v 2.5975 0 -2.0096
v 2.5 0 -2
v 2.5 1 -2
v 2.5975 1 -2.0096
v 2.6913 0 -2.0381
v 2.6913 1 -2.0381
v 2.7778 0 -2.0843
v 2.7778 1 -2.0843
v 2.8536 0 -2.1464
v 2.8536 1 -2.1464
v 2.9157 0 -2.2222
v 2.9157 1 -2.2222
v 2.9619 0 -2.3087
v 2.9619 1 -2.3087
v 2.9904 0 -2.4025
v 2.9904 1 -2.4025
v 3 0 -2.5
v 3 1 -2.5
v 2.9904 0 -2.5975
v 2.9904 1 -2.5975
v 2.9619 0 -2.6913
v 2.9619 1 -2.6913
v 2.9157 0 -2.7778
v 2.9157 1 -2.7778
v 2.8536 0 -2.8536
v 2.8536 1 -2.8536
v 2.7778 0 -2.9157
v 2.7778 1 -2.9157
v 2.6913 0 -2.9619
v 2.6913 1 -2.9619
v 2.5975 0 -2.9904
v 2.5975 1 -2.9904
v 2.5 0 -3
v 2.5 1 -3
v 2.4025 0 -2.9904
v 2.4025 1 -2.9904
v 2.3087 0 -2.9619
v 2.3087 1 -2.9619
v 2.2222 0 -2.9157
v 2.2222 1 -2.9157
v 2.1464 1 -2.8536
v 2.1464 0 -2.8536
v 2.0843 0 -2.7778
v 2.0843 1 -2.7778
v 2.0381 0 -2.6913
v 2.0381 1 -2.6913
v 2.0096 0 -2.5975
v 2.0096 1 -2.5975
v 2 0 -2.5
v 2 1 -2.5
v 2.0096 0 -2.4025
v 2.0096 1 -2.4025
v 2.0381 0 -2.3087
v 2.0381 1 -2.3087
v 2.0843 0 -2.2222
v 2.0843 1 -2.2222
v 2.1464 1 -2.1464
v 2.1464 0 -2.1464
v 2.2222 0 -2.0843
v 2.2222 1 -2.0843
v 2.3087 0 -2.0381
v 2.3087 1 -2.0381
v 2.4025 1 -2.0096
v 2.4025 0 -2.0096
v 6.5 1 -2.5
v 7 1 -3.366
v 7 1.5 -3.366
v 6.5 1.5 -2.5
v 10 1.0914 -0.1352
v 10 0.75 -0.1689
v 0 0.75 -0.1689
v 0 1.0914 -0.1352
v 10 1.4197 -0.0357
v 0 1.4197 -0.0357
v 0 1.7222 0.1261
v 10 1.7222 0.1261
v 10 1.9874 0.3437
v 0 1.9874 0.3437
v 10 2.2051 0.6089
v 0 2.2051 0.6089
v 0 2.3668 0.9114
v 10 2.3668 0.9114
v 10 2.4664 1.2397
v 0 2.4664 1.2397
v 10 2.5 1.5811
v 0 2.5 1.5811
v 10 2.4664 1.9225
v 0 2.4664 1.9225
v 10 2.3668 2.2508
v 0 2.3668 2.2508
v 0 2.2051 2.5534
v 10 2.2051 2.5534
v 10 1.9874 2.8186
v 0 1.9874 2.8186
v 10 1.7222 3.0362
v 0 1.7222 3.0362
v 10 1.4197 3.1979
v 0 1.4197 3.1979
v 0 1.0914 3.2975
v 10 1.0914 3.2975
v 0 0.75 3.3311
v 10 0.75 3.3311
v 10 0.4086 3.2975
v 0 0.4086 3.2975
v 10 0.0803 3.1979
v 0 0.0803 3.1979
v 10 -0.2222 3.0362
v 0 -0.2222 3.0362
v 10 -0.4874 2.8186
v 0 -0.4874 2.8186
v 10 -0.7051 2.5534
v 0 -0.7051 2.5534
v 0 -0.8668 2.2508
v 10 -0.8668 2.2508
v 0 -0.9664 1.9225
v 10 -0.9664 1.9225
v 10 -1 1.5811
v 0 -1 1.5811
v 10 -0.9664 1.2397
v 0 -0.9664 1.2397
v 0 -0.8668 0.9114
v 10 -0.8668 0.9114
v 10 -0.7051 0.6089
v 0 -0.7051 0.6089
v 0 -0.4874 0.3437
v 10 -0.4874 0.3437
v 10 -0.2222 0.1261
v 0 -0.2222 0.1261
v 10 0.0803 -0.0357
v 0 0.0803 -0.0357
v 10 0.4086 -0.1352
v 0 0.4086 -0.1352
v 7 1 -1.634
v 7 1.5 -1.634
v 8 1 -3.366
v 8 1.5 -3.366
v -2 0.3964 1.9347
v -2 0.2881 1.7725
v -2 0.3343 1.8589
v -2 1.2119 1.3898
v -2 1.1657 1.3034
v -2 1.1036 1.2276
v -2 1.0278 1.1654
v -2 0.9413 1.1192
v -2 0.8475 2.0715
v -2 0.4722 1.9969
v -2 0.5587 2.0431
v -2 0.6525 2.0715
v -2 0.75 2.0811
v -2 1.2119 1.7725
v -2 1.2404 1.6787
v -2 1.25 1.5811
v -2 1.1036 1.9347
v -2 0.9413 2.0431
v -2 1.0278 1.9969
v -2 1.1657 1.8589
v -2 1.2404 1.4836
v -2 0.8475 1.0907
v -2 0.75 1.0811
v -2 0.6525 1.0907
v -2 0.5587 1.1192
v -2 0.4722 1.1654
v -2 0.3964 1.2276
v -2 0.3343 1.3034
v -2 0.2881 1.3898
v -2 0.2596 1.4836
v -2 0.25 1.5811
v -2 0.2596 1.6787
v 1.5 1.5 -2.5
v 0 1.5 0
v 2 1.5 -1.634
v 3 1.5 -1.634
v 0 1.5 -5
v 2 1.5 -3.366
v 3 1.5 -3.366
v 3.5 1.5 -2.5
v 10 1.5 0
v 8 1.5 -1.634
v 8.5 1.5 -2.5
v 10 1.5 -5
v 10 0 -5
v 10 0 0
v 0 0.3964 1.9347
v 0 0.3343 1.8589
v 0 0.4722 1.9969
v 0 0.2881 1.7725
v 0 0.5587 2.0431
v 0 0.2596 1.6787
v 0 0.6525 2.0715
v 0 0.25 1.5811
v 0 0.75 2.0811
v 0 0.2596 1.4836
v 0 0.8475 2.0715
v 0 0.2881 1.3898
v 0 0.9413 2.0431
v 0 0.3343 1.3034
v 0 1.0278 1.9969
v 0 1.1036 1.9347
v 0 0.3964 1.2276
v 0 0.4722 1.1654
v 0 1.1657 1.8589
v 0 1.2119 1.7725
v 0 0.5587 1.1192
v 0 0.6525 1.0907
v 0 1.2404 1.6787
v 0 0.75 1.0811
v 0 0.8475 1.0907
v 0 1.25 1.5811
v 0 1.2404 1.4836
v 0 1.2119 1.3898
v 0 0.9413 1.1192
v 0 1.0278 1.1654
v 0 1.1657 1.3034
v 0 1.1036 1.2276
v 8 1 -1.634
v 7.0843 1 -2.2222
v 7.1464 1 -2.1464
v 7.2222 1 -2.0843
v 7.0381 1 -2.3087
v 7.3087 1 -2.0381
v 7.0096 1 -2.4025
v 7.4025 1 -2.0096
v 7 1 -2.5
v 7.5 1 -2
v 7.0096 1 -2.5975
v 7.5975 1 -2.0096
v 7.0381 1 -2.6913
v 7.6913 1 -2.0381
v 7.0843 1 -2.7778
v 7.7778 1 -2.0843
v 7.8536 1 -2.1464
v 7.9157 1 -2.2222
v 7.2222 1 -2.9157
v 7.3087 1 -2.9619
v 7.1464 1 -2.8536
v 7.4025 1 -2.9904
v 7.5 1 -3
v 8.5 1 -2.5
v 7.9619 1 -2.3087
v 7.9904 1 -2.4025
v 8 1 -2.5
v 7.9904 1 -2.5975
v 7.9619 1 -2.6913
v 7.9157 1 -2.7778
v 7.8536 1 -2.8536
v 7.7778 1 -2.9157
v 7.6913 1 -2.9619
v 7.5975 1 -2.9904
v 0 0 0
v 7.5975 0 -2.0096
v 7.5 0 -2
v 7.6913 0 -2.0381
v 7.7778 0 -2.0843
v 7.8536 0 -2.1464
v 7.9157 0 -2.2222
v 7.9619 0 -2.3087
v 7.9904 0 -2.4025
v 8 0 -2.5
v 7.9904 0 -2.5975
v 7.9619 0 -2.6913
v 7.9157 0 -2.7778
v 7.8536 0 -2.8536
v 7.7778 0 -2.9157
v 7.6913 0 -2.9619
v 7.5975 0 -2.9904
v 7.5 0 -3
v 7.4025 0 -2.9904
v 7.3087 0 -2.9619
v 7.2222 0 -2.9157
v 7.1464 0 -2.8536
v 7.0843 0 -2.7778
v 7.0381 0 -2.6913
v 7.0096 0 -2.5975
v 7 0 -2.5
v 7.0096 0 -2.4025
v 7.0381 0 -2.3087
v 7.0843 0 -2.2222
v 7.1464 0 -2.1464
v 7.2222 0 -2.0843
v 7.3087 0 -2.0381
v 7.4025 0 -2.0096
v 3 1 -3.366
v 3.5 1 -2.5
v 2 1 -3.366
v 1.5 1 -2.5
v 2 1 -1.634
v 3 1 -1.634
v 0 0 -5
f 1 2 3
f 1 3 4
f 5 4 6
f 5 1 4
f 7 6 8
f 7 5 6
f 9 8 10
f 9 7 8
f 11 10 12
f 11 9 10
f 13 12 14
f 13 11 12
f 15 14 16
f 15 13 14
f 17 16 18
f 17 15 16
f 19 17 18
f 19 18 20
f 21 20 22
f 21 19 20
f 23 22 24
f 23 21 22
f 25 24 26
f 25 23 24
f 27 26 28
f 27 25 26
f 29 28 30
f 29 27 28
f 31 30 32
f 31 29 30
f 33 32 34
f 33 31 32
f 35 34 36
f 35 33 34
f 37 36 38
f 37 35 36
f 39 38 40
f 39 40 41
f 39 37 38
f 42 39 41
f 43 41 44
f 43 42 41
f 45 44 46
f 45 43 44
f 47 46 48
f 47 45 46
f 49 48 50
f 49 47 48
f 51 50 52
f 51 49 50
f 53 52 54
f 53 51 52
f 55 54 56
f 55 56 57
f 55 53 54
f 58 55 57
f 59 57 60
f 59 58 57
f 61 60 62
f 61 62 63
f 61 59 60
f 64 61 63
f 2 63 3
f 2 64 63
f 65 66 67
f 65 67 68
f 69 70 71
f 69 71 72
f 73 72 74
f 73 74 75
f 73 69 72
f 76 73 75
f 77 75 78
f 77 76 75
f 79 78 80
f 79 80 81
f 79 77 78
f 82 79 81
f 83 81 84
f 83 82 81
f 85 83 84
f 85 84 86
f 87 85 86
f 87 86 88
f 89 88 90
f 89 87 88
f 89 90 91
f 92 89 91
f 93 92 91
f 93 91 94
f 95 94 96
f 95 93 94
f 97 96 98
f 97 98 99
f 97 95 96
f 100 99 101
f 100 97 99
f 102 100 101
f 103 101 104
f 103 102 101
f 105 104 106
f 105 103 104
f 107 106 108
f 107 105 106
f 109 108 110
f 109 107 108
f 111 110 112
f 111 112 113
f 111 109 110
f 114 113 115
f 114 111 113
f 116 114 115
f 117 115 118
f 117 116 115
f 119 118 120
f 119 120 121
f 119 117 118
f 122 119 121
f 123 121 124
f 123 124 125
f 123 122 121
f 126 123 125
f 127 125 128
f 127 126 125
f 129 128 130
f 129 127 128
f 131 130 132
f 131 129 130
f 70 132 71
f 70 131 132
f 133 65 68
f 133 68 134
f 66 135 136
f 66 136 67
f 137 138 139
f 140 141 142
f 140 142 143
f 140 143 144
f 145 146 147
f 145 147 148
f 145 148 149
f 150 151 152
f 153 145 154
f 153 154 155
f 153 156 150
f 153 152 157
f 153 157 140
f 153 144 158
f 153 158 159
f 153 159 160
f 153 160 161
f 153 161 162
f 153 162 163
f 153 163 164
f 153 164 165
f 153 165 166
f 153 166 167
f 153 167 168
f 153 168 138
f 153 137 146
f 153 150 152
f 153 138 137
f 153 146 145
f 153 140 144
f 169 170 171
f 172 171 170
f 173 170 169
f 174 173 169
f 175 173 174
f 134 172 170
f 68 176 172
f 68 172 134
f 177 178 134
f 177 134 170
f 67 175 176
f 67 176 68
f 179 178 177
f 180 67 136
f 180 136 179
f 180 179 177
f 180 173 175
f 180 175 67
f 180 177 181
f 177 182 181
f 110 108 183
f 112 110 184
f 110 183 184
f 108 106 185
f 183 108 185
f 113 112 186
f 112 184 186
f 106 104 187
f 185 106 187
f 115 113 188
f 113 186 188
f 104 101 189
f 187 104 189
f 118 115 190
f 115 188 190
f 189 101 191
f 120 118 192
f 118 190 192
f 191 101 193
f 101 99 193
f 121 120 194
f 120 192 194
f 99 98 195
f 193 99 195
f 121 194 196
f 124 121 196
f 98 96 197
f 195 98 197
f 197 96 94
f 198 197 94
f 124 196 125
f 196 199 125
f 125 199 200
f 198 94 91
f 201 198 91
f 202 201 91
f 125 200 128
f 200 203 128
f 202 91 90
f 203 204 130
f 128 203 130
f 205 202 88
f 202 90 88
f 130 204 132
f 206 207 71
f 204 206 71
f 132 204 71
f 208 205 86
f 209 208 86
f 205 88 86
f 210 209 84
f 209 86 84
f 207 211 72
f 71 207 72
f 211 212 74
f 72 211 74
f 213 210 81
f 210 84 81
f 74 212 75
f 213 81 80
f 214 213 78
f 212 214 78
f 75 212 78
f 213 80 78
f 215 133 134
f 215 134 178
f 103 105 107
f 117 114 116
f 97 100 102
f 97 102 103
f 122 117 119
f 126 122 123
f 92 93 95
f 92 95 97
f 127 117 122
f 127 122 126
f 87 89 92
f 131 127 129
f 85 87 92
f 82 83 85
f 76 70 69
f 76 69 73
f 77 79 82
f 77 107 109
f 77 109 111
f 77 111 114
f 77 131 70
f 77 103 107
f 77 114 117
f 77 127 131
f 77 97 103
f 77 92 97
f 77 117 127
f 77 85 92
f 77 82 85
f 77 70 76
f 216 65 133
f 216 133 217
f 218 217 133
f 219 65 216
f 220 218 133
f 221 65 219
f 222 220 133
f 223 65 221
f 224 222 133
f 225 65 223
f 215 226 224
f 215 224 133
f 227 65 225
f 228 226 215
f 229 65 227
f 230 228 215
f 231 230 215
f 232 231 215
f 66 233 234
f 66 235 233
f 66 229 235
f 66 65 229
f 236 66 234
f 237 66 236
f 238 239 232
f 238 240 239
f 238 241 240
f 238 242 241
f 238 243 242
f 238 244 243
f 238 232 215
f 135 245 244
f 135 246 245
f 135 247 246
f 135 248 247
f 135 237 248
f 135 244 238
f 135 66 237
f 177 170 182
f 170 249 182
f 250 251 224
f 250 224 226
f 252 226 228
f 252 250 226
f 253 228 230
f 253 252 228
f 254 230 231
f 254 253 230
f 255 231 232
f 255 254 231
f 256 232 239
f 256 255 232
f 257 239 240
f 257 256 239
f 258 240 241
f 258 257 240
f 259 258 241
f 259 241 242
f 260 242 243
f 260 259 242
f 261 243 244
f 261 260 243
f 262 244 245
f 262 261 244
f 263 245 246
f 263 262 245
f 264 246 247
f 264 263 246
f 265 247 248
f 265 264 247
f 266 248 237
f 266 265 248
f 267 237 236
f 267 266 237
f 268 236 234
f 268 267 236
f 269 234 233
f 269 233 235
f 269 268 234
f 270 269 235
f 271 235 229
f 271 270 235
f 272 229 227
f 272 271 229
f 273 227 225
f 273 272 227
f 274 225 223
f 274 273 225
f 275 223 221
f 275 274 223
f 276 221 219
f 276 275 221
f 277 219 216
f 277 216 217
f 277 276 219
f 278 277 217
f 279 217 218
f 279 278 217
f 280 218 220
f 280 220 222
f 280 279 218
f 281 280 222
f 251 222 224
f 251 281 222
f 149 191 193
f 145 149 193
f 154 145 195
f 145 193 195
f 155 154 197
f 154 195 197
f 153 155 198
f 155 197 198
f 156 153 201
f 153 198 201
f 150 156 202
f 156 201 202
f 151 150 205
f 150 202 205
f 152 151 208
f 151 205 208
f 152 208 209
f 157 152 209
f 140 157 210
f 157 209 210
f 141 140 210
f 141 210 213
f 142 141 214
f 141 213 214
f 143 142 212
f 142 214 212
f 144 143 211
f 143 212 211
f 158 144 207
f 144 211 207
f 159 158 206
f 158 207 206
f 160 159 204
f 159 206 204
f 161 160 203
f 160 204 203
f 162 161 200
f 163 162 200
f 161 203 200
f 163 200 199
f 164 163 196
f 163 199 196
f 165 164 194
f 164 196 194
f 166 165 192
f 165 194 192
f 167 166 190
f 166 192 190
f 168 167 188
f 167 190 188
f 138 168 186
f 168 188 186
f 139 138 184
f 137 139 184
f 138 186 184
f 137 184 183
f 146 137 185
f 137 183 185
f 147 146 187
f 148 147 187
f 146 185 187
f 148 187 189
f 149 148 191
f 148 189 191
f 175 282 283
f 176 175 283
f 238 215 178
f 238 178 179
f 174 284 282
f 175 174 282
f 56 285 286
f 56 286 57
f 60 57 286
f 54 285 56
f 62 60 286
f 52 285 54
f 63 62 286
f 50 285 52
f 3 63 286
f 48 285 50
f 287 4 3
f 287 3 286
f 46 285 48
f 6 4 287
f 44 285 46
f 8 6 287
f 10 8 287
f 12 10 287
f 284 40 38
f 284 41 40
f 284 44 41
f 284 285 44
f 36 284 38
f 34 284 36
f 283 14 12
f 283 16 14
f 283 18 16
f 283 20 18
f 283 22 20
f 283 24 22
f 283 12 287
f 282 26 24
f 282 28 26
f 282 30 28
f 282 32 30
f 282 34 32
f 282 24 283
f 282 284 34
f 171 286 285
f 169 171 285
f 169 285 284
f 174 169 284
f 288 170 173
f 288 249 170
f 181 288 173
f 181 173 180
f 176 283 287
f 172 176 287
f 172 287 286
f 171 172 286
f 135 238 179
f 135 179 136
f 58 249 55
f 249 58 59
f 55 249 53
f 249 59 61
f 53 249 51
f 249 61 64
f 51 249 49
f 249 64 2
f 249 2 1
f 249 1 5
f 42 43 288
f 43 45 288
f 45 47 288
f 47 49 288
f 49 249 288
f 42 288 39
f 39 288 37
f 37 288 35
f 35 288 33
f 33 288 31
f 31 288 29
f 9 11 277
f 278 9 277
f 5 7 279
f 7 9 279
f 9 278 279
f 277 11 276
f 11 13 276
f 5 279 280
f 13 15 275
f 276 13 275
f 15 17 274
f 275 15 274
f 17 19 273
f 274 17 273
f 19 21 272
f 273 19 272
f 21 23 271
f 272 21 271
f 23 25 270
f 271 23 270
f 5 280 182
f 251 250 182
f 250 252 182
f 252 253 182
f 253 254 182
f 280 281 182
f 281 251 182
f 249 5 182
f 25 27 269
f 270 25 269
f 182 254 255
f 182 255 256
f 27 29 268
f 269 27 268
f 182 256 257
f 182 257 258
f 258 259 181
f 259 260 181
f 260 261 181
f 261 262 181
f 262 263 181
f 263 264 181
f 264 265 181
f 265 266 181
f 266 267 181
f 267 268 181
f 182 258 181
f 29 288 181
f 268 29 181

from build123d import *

# Parameters (mm, degrees)
SKETCH_1_W      = 10
SKETCH_1_H      = 5
SKETCH_1_R      = 0.5
EXTRUDE_1_DEPTH = 1
SKETCH_2_W      = 10
SKETCH_2_H      = 5
EXTRUDE_2_DEPTH = 0.5
SKETCH_3_R      = 1.75
EXTRUDE_3_DEPTH = 10
SKETCH_5_R      = 0.5
EXTRUDE_4_DEPTH = 2


with BuildPart() as part:
    # 草图1 → 凸台-拉伸1 (new body)
    with BuildSketch(Plane(origin=(0, 0, 0), x_dir=(1, 0, 0), z_dir=(0, 1, 0))):
        with Locations((5, 2.5)):
            Rectangle(SKETCH_1_W, SKETCH_1_H)
        with Locations(Location((2.5, 2.5, 0), (0, 0, 270))):
            Circle(SKETCH_1_R, mode=Mode.SUBTRACT)
        with Locations(Location((7.5, 2.5, 0), (0, 0, 270))):
            Circle(SKETCH_1_R, mode=Mode.SUBTRACT)
    extrude(amount=EXTRUDE_1_DEPTH)

    # 草图2 → 凸台-拉伸2 (add)
    with BuildSketch(Plane(origin=(0, 1, 0), x_dir=(1, 0, 0), z_dir=(0, 1, 0))):
        with Locations((5, 2.5)):
            Rectangle(SKETCH_2_W, SKETCH_2_H)
        Polygon((3, 1.633974596), (2, 1.633974596), (1.5, 2.5), (2, 3.366025404), (3, 3.366025404), (3.5, 2.5), align=None, mode=Mode.SUBTRACT)
        Polygon((7, 3.366025404), (6.5, 2.5), (7, 1.633974596), (8, 1.633974596), (8.5, 2.5), (8, 3.366025404), align=None, mode=Mode.SUBTRACT)
    extrude(amount=EXTRUDE_2_DEPTH)


with BuildPart() as body_2:
    # 草图3 → 凸台-拉伸3 (new body)
    with BuildSketch(Plane(origin=(10, 0, 0), x_dir=(0, 0, -1), z_dir=(1, 0, 0))):
        with Locations((-1.58113883, 0.75)):
            Circle(SKETCH_3_R)
    extrude(amount=-EXTRUDE_3_DEPTH)

    # 草图5 → 凸台-拉伸4 (add)
    with BuildSketch(Plane.ZY):
        with Locations((1.58113883, 0.75)):
            Circle(SKETCH_5_R)
    extrude(amount=EXTRUDE_4_DEPTH)


solid = Compound([part.part, body_2.part])
